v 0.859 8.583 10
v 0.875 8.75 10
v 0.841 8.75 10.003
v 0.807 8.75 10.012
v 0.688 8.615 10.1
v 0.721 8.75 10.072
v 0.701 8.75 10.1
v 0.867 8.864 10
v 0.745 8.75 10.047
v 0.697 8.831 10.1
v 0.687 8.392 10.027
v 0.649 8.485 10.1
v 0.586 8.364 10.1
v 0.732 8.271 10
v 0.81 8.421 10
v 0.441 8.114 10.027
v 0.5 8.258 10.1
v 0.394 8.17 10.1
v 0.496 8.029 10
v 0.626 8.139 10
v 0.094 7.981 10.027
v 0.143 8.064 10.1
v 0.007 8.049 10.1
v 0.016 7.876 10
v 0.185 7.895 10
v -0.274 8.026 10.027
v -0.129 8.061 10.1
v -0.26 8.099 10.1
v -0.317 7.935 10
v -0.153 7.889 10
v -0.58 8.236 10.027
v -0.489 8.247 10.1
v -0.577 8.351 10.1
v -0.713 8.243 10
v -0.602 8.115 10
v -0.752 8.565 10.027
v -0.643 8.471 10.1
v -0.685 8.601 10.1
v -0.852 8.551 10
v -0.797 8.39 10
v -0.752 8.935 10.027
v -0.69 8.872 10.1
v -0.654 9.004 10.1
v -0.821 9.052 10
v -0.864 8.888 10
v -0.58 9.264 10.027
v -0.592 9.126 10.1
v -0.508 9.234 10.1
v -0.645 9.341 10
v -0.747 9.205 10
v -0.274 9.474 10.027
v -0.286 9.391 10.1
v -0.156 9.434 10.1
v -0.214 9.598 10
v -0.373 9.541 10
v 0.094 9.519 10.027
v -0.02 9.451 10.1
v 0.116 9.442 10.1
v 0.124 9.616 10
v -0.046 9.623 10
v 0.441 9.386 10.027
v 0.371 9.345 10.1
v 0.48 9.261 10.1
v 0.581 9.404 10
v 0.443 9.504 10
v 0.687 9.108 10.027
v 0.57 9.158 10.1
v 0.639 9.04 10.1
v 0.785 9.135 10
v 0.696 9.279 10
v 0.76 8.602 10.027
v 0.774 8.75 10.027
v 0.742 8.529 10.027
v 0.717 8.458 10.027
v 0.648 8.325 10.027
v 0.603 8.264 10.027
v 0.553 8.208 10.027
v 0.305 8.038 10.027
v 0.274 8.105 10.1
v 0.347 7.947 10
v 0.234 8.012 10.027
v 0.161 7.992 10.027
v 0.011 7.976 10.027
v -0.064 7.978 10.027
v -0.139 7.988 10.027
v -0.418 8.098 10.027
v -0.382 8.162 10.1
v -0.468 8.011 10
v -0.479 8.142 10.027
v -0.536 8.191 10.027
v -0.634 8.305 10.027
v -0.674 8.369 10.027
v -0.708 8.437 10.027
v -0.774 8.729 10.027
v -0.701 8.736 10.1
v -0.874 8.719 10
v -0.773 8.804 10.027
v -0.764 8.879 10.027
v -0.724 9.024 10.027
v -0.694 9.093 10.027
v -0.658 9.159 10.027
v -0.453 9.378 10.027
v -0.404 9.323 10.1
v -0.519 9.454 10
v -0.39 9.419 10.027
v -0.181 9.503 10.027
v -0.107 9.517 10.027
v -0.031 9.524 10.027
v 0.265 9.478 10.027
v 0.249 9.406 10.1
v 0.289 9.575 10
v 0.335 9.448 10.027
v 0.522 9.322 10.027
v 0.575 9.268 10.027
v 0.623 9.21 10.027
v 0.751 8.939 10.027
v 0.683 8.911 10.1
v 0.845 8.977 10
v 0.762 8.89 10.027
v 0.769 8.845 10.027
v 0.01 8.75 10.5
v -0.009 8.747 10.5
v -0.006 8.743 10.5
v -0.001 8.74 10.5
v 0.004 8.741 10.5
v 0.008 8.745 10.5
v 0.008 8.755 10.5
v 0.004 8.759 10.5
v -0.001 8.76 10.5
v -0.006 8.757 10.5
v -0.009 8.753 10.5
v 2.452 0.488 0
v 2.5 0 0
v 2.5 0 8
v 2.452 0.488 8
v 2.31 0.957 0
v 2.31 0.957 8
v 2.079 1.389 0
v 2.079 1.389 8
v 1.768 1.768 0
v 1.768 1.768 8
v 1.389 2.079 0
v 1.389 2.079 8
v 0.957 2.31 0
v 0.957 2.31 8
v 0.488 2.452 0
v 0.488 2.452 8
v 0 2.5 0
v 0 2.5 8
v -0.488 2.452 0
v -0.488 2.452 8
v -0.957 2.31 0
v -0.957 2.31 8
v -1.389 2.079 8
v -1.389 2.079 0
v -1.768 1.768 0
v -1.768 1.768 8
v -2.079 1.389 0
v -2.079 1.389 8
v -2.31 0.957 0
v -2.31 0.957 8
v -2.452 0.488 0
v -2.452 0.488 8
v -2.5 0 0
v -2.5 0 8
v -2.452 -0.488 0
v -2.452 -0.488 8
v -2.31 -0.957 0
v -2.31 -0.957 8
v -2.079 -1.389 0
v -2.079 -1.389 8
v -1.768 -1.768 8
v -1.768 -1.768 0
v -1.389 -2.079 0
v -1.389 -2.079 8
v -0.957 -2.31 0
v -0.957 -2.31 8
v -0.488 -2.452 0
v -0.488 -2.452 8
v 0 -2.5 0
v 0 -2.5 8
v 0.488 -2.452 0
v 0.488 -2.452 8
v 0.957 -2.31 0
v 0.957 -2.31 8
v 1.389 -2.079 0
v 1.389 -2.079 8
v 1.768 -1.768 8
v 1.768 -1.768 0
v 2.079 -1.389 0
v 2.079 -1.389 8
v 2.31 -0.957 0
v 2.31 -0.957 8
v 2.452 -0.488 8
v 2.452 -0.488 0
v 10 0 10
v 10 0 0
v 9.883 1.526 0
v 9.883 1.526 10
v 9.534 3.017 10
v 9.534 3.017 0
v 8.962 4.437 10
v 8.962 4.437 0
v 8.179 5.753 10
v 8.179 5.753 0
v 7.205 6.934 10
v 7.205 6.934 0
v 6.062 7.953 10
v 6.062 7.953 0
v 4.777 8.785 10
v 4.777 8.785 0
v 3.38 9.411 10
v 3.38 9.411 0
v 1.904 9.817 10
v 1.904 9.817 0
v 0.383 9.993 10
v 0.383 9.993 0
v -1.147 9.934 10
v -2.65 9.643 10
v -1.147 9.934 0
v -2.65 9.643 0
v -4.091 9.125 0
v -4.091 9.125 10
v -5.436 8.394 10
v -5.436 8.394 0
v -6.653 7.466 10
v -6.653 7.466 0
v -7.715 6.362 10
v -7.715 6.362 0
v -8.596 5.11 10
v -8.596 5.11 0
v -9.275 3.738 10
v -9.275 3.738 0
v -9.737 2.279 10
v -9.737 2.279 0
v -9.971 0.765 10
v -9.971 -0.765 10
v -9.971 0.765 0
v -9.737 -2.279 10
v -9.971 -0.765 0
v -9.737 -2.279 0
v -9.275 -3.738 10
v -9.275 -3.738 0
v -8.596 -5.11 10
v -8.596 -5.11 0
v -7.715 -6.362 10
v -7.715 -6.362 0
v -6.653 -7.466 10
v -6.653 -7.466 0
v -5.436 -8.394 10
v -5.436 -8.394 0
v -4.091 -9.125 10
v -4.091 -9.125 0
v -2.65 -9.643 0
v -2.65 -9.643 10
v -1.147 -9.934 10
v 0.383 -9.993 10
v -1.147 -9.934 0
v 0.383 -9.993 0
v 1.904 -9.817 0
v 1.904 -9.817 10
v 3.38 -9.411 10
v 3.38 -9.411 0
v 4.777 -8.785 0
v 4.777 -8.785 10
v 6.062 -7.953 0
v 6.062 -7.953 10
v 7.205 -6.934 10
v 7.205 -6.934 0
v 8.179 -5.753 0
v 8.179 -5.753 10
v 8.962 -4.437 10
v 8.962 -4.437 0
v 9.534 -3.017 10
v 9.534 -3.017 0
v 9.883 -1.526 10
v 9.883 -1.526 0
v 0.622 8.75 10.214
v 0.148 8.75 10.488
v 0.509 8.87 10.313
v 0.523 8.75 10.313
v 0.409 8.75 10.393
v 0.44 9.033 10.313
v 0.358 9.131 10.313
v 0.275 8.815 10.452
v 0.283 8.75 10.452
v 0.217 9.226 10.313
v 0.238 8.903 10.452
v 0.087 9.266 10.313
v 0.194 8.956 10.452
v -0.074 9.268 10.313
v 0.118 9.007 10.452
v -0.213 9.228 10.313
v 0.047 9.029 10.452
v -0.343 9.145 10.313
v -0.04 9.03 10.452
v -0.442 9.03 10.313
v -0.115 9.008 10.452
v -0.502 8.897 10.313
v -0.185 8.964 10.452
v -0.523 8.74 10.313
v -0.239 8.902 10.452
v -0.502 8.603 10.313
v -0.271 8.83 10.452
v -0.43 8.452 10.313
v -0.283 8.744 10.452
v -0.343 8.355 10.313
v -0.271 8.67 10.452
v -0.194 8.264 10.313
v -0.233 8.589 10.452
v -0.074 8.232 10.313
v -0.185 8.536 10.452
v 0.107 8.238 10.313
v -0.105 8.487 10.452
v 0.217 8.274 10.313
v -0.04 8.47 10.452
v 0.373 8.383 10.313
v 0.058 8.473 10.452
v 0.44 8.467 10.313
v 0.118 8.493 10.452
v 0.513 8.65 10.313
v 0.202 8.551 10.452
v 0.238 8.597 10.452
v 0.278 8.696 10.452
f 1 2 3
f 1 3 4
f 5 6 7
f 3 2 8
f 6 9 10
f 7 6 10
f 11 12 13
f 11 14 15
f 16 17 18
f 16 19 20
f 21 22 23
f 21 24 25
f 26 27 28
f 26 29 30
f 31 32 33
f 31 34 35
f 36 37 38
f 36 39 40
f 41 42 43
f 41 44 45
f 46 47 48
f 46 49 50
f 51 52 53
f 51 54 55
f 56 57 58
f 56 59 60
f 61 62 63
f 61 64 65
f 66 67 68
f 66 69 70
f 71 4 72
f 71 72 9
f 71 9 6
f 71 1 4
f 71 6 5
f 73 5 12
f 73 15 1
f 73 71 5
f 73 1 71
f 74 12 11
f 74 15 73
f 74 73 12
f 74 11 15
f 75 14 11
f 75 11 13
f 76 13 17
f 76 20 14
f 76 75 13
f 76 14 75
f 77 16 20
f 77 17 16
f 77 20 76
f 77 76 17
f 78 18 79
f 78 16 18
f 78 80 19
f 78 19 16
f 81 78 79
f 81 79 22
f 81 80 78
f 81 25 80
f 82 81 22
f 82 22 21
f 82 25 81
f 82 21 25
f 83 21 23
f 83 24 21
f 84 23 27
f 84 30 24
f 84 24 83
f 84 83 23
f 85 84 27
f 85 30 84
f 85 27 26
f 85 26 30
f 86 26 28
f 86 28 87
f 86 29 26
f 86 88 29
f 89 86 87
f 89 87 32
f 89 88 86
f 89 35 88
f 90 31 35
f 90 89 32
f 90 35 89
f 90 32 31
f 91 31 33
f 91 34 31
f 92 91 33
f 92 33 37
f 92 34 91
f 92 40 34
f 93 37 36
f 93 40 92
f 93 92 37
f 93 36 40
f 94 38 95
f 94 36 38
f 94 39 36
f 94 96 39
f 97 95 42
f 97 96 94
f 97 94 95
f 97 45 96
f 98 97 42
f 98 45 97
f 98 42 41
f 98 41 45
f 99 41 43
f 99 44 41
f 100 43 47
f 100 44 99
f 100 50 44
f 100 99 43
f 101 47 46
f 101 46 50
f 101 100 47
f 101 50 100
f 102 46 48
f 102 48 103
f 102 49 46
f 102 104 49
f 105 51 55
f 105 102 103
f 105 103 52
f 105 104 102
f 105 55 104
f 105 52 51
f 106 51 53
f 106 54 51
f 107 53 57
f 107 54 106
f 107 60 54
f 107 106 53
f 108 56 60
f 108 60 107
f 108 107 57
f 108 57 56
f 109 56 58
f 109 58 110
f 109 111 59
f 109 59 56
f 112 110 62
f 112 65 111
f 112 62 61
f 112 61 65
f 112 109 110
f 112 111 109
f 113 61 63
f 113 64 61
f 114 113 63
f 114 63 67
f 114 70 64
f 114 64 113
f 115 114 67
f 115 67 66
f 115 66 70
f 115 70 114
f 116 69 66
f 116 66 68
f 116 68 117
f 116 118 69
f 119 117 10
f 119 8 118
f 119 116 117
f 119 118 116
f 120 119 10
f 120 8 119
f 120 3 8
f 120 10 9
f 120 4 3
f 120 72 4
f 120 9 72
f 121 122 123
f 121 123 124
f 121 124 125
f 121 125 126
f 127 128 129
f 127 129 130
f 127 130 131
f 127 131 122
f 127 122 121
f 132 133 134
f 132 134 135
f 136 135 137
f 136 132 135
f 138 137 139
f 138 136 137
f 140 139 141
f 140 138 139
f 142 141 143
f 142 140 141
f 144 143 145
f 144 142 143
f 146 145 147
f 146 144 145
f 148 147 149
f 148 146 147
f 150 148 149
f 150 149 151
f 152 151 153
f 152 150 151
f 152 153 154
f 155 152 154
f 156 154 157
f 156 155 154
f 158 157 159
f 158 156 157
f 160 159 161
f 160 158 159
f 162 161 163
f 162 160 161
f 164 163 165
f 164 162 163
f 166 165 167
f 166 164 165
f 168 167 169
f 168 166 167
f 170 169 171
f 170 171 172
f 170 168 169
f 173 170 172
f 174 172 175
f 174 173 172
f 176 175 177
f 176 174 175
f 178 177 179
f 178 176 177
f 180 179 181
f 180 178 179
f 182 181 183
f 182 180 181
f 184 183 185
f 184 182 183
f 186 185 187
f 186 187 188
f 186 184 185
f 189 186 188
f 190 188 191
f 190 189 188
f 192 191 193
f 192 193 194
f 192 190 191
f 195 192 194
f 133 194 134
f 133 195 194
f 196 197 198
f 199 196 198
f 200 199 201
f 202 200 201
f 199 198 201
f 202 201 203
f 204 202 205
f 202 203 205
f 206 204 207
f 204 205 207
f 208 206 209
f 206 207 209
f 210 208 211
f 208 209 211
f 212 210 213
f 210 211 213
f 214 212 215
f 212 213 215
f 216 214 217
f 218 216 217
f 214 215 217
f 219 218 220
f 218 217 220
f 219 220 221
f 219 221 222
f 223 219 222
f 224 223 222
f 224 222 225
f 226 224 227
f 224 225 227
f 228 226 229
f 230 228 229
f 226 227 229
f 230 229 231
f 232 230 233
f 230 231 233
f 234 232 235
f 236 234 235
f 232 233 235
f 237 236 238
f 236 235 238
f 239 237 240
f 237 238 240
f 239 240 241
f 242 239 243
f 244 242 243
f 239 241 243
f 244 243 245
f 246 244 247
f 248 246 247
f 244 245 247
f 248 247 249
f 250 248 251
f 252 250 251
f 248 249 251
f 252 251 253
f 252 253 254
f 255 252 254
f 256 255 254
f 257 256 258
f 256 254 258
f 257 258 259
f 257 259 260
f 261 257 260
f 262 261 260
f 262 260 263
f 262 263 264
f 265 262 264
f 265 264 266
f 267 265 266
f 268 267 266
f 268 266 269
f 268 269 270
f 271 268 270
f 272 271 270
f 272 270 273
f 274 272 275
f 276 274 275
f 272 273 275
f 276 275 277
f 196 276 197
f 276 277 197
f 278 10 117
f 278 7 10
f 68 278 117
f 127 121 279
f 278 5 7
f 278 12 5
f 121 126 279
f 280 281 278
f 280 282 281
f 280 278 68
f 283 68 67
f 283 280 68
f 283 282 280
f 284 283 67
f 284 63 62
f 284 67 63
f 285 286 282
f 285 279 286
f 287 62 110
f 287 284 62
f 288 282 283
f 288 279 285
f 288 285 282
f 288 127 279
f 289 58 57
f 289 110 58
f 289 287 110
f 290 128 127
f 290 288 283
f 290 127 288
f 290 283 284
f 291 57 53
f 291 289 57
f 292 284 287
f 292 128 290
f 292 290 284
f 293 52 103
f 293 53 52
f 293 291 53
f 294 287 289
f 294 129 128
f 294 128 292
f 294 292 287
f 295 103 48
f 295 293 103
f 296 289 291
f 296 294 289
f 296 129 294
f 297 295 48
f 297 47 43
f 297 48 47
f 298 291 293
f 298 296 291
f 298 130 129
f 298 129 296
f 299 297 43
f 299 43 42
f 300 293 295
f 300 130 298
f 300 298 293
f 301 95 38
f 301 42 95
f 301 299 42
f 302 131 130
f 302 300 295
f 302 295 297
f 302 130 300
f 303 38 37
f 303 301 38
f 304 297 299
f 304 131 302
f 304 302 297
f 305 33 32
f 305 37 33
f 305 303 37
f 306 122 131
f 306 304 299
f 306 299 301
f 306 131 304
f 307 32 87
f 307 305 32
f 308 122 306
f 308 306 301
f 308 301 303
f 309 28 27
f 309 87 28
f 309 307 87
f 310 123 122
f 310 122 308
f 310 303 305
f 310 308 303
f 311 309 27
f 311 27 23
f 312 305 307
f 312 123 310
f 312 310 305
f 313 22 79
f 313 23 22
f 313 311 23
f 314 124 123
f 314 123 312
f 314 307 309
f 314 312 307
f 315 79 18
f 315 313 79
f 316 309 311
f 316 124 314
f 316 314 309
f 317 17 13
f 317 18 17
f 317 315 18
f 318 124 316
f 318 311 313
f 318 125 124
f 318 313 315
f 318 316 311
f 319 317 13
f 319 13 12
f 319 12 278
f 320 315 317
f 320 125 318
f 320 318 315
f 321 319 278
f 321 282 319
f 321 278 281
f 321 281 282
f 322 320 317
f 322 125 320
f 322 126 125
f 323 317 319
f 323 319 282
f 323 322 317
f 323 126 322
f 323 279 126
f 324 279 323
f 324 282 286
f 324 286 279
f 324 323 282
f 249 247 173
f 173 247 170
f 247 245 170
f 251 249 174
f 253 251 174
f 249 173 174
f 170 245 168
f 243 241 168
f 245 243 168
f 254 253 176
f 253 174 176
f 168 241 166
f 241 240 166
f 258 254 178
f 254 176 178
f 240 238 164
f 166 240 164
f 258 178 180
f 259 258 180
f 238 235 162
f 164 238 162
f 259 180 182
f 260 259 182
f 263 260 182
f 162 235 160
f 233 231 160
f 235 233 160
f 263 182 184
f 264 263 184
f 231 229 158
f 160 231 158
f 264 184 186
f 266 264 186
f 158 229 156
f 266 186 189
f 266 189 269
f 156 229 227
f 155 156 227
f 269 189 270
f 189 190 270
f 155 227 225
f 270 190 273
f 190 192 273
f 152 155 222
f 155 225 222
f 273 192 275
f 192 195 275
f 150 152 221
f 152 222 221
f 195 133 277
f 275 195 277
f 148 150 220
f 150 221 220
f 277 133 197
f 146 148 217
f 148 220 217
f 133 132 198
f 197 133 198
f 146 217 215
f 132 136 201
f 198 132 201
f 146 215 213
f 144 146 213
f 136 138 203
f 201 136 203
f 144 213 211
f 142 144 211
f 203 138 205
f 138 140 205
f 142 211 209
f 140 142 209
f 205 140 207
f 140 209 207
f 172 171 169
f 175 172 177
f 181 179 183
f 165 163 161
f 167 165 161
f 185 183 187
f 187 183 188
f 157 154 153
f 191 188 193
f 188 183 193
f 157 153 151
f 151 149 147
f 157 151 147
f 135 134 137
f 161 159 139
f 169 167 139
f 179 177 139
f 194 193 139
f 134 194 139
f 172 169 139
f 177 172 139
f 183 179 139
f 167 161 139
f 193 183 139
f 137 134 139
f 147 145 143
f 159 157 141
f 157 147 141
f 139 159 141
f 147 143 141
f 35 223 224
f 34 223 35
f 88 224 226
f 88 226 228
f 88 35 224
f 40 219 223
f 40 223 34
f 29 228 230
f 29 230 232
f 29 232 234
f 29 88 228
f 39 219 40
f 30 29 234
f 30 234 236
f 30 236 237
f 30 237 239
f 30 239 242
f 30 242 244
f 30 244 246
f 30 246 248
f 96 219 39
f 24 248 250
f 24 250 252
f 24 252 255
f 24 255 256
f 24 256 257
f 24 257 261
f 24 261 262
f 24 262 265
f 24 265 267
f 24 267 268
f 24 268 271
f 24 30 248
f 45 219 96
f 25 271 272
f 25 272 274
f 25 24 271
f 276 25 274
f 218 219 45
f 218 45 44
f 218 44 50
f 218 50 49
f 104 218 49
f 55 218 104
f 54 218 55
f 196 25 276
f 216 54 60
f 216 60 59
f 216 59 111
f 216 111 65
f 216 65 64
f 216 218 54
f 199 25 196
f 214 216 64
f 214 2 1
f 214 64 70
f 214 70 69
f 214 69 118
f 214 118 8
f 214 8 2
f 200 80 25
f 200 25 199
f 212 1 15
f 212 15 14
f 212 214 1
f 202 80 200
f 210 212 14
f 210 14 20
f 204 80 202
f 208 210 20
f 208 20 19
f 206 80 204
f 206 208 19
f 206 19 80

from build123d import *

# Parameters (mm, degrees)
F0_R     = 10
F0_R_2   = 2.5
F0_R_3   = 0.75
F1_DEPTH = 10
F2_DEPTH = 8
F3_DEPTH = 10.5
F5_R     = 0.2


# Not quite as in the source:
# - a fillet or chamfer that OpenCascade refuses, or shapes differently, is made with other operations: its cross-section is extruded or revolved along the edge and cut away or added


with BuildPart() as f1:
    # F0 (on Top) → F1 (new body)
    with BuildSketch(Plane.XY):
        Circle(F0_R)
        Circle(F0_R_2, mode=Mode.SUBTRACT)
        with Locations((0, 8.75)):
            Circle(F0_R_3, mode=Mode.SUBTRACT)
        with Locations((0, 8.75)):
            Circle(F0_R_3)
        Circle(F0_R_2)
    extrude(amount=F1_DEPTH)

    # F0 (on Top) → F2 (cut)
    with BuildSketch(Plane.XY):
        Circle(F0_R_2)
    extrude(amount=F2_DEPTH, mode=Mode.SUBTRACT)

    # F0 (on Top) → F3 (join)
    with BuildSketch(Plane.XY):
        with Locations((0, 8.75)):
            Circle(F0_R_3)
    extrude(amount=F3_DEPTH)

    # F4: fillet of radius 0.798 on 1 edges, made by hand

    # F4_s1 → F4_t2 (revolve, cut)
    with BuildSketch(Plane.XZ.offset(-8.75)):
        with BuildLine():
            ThreePointArc((0.75, 10), (0.4563840077, 10.3632896491), (0.0097297791, 10.5))
            Line((0.0097297791, 10.5), (0.75, 10.5))
            Line((0.75, 10.5), (0.75, 10))
        make_face()
    revolve(axis=Axis((0, 8.75, 10.5), (0, 0, 1)), mode=Mode.SUBTRACT)

    # F5
    f5_edges = [f1.edges().sort_by_distance(p)[0] for p in [
        (-0.75, 8.75, 10),
    ]]
    fillet(f5_edges, radius=F5_R)


solid = f1.part
